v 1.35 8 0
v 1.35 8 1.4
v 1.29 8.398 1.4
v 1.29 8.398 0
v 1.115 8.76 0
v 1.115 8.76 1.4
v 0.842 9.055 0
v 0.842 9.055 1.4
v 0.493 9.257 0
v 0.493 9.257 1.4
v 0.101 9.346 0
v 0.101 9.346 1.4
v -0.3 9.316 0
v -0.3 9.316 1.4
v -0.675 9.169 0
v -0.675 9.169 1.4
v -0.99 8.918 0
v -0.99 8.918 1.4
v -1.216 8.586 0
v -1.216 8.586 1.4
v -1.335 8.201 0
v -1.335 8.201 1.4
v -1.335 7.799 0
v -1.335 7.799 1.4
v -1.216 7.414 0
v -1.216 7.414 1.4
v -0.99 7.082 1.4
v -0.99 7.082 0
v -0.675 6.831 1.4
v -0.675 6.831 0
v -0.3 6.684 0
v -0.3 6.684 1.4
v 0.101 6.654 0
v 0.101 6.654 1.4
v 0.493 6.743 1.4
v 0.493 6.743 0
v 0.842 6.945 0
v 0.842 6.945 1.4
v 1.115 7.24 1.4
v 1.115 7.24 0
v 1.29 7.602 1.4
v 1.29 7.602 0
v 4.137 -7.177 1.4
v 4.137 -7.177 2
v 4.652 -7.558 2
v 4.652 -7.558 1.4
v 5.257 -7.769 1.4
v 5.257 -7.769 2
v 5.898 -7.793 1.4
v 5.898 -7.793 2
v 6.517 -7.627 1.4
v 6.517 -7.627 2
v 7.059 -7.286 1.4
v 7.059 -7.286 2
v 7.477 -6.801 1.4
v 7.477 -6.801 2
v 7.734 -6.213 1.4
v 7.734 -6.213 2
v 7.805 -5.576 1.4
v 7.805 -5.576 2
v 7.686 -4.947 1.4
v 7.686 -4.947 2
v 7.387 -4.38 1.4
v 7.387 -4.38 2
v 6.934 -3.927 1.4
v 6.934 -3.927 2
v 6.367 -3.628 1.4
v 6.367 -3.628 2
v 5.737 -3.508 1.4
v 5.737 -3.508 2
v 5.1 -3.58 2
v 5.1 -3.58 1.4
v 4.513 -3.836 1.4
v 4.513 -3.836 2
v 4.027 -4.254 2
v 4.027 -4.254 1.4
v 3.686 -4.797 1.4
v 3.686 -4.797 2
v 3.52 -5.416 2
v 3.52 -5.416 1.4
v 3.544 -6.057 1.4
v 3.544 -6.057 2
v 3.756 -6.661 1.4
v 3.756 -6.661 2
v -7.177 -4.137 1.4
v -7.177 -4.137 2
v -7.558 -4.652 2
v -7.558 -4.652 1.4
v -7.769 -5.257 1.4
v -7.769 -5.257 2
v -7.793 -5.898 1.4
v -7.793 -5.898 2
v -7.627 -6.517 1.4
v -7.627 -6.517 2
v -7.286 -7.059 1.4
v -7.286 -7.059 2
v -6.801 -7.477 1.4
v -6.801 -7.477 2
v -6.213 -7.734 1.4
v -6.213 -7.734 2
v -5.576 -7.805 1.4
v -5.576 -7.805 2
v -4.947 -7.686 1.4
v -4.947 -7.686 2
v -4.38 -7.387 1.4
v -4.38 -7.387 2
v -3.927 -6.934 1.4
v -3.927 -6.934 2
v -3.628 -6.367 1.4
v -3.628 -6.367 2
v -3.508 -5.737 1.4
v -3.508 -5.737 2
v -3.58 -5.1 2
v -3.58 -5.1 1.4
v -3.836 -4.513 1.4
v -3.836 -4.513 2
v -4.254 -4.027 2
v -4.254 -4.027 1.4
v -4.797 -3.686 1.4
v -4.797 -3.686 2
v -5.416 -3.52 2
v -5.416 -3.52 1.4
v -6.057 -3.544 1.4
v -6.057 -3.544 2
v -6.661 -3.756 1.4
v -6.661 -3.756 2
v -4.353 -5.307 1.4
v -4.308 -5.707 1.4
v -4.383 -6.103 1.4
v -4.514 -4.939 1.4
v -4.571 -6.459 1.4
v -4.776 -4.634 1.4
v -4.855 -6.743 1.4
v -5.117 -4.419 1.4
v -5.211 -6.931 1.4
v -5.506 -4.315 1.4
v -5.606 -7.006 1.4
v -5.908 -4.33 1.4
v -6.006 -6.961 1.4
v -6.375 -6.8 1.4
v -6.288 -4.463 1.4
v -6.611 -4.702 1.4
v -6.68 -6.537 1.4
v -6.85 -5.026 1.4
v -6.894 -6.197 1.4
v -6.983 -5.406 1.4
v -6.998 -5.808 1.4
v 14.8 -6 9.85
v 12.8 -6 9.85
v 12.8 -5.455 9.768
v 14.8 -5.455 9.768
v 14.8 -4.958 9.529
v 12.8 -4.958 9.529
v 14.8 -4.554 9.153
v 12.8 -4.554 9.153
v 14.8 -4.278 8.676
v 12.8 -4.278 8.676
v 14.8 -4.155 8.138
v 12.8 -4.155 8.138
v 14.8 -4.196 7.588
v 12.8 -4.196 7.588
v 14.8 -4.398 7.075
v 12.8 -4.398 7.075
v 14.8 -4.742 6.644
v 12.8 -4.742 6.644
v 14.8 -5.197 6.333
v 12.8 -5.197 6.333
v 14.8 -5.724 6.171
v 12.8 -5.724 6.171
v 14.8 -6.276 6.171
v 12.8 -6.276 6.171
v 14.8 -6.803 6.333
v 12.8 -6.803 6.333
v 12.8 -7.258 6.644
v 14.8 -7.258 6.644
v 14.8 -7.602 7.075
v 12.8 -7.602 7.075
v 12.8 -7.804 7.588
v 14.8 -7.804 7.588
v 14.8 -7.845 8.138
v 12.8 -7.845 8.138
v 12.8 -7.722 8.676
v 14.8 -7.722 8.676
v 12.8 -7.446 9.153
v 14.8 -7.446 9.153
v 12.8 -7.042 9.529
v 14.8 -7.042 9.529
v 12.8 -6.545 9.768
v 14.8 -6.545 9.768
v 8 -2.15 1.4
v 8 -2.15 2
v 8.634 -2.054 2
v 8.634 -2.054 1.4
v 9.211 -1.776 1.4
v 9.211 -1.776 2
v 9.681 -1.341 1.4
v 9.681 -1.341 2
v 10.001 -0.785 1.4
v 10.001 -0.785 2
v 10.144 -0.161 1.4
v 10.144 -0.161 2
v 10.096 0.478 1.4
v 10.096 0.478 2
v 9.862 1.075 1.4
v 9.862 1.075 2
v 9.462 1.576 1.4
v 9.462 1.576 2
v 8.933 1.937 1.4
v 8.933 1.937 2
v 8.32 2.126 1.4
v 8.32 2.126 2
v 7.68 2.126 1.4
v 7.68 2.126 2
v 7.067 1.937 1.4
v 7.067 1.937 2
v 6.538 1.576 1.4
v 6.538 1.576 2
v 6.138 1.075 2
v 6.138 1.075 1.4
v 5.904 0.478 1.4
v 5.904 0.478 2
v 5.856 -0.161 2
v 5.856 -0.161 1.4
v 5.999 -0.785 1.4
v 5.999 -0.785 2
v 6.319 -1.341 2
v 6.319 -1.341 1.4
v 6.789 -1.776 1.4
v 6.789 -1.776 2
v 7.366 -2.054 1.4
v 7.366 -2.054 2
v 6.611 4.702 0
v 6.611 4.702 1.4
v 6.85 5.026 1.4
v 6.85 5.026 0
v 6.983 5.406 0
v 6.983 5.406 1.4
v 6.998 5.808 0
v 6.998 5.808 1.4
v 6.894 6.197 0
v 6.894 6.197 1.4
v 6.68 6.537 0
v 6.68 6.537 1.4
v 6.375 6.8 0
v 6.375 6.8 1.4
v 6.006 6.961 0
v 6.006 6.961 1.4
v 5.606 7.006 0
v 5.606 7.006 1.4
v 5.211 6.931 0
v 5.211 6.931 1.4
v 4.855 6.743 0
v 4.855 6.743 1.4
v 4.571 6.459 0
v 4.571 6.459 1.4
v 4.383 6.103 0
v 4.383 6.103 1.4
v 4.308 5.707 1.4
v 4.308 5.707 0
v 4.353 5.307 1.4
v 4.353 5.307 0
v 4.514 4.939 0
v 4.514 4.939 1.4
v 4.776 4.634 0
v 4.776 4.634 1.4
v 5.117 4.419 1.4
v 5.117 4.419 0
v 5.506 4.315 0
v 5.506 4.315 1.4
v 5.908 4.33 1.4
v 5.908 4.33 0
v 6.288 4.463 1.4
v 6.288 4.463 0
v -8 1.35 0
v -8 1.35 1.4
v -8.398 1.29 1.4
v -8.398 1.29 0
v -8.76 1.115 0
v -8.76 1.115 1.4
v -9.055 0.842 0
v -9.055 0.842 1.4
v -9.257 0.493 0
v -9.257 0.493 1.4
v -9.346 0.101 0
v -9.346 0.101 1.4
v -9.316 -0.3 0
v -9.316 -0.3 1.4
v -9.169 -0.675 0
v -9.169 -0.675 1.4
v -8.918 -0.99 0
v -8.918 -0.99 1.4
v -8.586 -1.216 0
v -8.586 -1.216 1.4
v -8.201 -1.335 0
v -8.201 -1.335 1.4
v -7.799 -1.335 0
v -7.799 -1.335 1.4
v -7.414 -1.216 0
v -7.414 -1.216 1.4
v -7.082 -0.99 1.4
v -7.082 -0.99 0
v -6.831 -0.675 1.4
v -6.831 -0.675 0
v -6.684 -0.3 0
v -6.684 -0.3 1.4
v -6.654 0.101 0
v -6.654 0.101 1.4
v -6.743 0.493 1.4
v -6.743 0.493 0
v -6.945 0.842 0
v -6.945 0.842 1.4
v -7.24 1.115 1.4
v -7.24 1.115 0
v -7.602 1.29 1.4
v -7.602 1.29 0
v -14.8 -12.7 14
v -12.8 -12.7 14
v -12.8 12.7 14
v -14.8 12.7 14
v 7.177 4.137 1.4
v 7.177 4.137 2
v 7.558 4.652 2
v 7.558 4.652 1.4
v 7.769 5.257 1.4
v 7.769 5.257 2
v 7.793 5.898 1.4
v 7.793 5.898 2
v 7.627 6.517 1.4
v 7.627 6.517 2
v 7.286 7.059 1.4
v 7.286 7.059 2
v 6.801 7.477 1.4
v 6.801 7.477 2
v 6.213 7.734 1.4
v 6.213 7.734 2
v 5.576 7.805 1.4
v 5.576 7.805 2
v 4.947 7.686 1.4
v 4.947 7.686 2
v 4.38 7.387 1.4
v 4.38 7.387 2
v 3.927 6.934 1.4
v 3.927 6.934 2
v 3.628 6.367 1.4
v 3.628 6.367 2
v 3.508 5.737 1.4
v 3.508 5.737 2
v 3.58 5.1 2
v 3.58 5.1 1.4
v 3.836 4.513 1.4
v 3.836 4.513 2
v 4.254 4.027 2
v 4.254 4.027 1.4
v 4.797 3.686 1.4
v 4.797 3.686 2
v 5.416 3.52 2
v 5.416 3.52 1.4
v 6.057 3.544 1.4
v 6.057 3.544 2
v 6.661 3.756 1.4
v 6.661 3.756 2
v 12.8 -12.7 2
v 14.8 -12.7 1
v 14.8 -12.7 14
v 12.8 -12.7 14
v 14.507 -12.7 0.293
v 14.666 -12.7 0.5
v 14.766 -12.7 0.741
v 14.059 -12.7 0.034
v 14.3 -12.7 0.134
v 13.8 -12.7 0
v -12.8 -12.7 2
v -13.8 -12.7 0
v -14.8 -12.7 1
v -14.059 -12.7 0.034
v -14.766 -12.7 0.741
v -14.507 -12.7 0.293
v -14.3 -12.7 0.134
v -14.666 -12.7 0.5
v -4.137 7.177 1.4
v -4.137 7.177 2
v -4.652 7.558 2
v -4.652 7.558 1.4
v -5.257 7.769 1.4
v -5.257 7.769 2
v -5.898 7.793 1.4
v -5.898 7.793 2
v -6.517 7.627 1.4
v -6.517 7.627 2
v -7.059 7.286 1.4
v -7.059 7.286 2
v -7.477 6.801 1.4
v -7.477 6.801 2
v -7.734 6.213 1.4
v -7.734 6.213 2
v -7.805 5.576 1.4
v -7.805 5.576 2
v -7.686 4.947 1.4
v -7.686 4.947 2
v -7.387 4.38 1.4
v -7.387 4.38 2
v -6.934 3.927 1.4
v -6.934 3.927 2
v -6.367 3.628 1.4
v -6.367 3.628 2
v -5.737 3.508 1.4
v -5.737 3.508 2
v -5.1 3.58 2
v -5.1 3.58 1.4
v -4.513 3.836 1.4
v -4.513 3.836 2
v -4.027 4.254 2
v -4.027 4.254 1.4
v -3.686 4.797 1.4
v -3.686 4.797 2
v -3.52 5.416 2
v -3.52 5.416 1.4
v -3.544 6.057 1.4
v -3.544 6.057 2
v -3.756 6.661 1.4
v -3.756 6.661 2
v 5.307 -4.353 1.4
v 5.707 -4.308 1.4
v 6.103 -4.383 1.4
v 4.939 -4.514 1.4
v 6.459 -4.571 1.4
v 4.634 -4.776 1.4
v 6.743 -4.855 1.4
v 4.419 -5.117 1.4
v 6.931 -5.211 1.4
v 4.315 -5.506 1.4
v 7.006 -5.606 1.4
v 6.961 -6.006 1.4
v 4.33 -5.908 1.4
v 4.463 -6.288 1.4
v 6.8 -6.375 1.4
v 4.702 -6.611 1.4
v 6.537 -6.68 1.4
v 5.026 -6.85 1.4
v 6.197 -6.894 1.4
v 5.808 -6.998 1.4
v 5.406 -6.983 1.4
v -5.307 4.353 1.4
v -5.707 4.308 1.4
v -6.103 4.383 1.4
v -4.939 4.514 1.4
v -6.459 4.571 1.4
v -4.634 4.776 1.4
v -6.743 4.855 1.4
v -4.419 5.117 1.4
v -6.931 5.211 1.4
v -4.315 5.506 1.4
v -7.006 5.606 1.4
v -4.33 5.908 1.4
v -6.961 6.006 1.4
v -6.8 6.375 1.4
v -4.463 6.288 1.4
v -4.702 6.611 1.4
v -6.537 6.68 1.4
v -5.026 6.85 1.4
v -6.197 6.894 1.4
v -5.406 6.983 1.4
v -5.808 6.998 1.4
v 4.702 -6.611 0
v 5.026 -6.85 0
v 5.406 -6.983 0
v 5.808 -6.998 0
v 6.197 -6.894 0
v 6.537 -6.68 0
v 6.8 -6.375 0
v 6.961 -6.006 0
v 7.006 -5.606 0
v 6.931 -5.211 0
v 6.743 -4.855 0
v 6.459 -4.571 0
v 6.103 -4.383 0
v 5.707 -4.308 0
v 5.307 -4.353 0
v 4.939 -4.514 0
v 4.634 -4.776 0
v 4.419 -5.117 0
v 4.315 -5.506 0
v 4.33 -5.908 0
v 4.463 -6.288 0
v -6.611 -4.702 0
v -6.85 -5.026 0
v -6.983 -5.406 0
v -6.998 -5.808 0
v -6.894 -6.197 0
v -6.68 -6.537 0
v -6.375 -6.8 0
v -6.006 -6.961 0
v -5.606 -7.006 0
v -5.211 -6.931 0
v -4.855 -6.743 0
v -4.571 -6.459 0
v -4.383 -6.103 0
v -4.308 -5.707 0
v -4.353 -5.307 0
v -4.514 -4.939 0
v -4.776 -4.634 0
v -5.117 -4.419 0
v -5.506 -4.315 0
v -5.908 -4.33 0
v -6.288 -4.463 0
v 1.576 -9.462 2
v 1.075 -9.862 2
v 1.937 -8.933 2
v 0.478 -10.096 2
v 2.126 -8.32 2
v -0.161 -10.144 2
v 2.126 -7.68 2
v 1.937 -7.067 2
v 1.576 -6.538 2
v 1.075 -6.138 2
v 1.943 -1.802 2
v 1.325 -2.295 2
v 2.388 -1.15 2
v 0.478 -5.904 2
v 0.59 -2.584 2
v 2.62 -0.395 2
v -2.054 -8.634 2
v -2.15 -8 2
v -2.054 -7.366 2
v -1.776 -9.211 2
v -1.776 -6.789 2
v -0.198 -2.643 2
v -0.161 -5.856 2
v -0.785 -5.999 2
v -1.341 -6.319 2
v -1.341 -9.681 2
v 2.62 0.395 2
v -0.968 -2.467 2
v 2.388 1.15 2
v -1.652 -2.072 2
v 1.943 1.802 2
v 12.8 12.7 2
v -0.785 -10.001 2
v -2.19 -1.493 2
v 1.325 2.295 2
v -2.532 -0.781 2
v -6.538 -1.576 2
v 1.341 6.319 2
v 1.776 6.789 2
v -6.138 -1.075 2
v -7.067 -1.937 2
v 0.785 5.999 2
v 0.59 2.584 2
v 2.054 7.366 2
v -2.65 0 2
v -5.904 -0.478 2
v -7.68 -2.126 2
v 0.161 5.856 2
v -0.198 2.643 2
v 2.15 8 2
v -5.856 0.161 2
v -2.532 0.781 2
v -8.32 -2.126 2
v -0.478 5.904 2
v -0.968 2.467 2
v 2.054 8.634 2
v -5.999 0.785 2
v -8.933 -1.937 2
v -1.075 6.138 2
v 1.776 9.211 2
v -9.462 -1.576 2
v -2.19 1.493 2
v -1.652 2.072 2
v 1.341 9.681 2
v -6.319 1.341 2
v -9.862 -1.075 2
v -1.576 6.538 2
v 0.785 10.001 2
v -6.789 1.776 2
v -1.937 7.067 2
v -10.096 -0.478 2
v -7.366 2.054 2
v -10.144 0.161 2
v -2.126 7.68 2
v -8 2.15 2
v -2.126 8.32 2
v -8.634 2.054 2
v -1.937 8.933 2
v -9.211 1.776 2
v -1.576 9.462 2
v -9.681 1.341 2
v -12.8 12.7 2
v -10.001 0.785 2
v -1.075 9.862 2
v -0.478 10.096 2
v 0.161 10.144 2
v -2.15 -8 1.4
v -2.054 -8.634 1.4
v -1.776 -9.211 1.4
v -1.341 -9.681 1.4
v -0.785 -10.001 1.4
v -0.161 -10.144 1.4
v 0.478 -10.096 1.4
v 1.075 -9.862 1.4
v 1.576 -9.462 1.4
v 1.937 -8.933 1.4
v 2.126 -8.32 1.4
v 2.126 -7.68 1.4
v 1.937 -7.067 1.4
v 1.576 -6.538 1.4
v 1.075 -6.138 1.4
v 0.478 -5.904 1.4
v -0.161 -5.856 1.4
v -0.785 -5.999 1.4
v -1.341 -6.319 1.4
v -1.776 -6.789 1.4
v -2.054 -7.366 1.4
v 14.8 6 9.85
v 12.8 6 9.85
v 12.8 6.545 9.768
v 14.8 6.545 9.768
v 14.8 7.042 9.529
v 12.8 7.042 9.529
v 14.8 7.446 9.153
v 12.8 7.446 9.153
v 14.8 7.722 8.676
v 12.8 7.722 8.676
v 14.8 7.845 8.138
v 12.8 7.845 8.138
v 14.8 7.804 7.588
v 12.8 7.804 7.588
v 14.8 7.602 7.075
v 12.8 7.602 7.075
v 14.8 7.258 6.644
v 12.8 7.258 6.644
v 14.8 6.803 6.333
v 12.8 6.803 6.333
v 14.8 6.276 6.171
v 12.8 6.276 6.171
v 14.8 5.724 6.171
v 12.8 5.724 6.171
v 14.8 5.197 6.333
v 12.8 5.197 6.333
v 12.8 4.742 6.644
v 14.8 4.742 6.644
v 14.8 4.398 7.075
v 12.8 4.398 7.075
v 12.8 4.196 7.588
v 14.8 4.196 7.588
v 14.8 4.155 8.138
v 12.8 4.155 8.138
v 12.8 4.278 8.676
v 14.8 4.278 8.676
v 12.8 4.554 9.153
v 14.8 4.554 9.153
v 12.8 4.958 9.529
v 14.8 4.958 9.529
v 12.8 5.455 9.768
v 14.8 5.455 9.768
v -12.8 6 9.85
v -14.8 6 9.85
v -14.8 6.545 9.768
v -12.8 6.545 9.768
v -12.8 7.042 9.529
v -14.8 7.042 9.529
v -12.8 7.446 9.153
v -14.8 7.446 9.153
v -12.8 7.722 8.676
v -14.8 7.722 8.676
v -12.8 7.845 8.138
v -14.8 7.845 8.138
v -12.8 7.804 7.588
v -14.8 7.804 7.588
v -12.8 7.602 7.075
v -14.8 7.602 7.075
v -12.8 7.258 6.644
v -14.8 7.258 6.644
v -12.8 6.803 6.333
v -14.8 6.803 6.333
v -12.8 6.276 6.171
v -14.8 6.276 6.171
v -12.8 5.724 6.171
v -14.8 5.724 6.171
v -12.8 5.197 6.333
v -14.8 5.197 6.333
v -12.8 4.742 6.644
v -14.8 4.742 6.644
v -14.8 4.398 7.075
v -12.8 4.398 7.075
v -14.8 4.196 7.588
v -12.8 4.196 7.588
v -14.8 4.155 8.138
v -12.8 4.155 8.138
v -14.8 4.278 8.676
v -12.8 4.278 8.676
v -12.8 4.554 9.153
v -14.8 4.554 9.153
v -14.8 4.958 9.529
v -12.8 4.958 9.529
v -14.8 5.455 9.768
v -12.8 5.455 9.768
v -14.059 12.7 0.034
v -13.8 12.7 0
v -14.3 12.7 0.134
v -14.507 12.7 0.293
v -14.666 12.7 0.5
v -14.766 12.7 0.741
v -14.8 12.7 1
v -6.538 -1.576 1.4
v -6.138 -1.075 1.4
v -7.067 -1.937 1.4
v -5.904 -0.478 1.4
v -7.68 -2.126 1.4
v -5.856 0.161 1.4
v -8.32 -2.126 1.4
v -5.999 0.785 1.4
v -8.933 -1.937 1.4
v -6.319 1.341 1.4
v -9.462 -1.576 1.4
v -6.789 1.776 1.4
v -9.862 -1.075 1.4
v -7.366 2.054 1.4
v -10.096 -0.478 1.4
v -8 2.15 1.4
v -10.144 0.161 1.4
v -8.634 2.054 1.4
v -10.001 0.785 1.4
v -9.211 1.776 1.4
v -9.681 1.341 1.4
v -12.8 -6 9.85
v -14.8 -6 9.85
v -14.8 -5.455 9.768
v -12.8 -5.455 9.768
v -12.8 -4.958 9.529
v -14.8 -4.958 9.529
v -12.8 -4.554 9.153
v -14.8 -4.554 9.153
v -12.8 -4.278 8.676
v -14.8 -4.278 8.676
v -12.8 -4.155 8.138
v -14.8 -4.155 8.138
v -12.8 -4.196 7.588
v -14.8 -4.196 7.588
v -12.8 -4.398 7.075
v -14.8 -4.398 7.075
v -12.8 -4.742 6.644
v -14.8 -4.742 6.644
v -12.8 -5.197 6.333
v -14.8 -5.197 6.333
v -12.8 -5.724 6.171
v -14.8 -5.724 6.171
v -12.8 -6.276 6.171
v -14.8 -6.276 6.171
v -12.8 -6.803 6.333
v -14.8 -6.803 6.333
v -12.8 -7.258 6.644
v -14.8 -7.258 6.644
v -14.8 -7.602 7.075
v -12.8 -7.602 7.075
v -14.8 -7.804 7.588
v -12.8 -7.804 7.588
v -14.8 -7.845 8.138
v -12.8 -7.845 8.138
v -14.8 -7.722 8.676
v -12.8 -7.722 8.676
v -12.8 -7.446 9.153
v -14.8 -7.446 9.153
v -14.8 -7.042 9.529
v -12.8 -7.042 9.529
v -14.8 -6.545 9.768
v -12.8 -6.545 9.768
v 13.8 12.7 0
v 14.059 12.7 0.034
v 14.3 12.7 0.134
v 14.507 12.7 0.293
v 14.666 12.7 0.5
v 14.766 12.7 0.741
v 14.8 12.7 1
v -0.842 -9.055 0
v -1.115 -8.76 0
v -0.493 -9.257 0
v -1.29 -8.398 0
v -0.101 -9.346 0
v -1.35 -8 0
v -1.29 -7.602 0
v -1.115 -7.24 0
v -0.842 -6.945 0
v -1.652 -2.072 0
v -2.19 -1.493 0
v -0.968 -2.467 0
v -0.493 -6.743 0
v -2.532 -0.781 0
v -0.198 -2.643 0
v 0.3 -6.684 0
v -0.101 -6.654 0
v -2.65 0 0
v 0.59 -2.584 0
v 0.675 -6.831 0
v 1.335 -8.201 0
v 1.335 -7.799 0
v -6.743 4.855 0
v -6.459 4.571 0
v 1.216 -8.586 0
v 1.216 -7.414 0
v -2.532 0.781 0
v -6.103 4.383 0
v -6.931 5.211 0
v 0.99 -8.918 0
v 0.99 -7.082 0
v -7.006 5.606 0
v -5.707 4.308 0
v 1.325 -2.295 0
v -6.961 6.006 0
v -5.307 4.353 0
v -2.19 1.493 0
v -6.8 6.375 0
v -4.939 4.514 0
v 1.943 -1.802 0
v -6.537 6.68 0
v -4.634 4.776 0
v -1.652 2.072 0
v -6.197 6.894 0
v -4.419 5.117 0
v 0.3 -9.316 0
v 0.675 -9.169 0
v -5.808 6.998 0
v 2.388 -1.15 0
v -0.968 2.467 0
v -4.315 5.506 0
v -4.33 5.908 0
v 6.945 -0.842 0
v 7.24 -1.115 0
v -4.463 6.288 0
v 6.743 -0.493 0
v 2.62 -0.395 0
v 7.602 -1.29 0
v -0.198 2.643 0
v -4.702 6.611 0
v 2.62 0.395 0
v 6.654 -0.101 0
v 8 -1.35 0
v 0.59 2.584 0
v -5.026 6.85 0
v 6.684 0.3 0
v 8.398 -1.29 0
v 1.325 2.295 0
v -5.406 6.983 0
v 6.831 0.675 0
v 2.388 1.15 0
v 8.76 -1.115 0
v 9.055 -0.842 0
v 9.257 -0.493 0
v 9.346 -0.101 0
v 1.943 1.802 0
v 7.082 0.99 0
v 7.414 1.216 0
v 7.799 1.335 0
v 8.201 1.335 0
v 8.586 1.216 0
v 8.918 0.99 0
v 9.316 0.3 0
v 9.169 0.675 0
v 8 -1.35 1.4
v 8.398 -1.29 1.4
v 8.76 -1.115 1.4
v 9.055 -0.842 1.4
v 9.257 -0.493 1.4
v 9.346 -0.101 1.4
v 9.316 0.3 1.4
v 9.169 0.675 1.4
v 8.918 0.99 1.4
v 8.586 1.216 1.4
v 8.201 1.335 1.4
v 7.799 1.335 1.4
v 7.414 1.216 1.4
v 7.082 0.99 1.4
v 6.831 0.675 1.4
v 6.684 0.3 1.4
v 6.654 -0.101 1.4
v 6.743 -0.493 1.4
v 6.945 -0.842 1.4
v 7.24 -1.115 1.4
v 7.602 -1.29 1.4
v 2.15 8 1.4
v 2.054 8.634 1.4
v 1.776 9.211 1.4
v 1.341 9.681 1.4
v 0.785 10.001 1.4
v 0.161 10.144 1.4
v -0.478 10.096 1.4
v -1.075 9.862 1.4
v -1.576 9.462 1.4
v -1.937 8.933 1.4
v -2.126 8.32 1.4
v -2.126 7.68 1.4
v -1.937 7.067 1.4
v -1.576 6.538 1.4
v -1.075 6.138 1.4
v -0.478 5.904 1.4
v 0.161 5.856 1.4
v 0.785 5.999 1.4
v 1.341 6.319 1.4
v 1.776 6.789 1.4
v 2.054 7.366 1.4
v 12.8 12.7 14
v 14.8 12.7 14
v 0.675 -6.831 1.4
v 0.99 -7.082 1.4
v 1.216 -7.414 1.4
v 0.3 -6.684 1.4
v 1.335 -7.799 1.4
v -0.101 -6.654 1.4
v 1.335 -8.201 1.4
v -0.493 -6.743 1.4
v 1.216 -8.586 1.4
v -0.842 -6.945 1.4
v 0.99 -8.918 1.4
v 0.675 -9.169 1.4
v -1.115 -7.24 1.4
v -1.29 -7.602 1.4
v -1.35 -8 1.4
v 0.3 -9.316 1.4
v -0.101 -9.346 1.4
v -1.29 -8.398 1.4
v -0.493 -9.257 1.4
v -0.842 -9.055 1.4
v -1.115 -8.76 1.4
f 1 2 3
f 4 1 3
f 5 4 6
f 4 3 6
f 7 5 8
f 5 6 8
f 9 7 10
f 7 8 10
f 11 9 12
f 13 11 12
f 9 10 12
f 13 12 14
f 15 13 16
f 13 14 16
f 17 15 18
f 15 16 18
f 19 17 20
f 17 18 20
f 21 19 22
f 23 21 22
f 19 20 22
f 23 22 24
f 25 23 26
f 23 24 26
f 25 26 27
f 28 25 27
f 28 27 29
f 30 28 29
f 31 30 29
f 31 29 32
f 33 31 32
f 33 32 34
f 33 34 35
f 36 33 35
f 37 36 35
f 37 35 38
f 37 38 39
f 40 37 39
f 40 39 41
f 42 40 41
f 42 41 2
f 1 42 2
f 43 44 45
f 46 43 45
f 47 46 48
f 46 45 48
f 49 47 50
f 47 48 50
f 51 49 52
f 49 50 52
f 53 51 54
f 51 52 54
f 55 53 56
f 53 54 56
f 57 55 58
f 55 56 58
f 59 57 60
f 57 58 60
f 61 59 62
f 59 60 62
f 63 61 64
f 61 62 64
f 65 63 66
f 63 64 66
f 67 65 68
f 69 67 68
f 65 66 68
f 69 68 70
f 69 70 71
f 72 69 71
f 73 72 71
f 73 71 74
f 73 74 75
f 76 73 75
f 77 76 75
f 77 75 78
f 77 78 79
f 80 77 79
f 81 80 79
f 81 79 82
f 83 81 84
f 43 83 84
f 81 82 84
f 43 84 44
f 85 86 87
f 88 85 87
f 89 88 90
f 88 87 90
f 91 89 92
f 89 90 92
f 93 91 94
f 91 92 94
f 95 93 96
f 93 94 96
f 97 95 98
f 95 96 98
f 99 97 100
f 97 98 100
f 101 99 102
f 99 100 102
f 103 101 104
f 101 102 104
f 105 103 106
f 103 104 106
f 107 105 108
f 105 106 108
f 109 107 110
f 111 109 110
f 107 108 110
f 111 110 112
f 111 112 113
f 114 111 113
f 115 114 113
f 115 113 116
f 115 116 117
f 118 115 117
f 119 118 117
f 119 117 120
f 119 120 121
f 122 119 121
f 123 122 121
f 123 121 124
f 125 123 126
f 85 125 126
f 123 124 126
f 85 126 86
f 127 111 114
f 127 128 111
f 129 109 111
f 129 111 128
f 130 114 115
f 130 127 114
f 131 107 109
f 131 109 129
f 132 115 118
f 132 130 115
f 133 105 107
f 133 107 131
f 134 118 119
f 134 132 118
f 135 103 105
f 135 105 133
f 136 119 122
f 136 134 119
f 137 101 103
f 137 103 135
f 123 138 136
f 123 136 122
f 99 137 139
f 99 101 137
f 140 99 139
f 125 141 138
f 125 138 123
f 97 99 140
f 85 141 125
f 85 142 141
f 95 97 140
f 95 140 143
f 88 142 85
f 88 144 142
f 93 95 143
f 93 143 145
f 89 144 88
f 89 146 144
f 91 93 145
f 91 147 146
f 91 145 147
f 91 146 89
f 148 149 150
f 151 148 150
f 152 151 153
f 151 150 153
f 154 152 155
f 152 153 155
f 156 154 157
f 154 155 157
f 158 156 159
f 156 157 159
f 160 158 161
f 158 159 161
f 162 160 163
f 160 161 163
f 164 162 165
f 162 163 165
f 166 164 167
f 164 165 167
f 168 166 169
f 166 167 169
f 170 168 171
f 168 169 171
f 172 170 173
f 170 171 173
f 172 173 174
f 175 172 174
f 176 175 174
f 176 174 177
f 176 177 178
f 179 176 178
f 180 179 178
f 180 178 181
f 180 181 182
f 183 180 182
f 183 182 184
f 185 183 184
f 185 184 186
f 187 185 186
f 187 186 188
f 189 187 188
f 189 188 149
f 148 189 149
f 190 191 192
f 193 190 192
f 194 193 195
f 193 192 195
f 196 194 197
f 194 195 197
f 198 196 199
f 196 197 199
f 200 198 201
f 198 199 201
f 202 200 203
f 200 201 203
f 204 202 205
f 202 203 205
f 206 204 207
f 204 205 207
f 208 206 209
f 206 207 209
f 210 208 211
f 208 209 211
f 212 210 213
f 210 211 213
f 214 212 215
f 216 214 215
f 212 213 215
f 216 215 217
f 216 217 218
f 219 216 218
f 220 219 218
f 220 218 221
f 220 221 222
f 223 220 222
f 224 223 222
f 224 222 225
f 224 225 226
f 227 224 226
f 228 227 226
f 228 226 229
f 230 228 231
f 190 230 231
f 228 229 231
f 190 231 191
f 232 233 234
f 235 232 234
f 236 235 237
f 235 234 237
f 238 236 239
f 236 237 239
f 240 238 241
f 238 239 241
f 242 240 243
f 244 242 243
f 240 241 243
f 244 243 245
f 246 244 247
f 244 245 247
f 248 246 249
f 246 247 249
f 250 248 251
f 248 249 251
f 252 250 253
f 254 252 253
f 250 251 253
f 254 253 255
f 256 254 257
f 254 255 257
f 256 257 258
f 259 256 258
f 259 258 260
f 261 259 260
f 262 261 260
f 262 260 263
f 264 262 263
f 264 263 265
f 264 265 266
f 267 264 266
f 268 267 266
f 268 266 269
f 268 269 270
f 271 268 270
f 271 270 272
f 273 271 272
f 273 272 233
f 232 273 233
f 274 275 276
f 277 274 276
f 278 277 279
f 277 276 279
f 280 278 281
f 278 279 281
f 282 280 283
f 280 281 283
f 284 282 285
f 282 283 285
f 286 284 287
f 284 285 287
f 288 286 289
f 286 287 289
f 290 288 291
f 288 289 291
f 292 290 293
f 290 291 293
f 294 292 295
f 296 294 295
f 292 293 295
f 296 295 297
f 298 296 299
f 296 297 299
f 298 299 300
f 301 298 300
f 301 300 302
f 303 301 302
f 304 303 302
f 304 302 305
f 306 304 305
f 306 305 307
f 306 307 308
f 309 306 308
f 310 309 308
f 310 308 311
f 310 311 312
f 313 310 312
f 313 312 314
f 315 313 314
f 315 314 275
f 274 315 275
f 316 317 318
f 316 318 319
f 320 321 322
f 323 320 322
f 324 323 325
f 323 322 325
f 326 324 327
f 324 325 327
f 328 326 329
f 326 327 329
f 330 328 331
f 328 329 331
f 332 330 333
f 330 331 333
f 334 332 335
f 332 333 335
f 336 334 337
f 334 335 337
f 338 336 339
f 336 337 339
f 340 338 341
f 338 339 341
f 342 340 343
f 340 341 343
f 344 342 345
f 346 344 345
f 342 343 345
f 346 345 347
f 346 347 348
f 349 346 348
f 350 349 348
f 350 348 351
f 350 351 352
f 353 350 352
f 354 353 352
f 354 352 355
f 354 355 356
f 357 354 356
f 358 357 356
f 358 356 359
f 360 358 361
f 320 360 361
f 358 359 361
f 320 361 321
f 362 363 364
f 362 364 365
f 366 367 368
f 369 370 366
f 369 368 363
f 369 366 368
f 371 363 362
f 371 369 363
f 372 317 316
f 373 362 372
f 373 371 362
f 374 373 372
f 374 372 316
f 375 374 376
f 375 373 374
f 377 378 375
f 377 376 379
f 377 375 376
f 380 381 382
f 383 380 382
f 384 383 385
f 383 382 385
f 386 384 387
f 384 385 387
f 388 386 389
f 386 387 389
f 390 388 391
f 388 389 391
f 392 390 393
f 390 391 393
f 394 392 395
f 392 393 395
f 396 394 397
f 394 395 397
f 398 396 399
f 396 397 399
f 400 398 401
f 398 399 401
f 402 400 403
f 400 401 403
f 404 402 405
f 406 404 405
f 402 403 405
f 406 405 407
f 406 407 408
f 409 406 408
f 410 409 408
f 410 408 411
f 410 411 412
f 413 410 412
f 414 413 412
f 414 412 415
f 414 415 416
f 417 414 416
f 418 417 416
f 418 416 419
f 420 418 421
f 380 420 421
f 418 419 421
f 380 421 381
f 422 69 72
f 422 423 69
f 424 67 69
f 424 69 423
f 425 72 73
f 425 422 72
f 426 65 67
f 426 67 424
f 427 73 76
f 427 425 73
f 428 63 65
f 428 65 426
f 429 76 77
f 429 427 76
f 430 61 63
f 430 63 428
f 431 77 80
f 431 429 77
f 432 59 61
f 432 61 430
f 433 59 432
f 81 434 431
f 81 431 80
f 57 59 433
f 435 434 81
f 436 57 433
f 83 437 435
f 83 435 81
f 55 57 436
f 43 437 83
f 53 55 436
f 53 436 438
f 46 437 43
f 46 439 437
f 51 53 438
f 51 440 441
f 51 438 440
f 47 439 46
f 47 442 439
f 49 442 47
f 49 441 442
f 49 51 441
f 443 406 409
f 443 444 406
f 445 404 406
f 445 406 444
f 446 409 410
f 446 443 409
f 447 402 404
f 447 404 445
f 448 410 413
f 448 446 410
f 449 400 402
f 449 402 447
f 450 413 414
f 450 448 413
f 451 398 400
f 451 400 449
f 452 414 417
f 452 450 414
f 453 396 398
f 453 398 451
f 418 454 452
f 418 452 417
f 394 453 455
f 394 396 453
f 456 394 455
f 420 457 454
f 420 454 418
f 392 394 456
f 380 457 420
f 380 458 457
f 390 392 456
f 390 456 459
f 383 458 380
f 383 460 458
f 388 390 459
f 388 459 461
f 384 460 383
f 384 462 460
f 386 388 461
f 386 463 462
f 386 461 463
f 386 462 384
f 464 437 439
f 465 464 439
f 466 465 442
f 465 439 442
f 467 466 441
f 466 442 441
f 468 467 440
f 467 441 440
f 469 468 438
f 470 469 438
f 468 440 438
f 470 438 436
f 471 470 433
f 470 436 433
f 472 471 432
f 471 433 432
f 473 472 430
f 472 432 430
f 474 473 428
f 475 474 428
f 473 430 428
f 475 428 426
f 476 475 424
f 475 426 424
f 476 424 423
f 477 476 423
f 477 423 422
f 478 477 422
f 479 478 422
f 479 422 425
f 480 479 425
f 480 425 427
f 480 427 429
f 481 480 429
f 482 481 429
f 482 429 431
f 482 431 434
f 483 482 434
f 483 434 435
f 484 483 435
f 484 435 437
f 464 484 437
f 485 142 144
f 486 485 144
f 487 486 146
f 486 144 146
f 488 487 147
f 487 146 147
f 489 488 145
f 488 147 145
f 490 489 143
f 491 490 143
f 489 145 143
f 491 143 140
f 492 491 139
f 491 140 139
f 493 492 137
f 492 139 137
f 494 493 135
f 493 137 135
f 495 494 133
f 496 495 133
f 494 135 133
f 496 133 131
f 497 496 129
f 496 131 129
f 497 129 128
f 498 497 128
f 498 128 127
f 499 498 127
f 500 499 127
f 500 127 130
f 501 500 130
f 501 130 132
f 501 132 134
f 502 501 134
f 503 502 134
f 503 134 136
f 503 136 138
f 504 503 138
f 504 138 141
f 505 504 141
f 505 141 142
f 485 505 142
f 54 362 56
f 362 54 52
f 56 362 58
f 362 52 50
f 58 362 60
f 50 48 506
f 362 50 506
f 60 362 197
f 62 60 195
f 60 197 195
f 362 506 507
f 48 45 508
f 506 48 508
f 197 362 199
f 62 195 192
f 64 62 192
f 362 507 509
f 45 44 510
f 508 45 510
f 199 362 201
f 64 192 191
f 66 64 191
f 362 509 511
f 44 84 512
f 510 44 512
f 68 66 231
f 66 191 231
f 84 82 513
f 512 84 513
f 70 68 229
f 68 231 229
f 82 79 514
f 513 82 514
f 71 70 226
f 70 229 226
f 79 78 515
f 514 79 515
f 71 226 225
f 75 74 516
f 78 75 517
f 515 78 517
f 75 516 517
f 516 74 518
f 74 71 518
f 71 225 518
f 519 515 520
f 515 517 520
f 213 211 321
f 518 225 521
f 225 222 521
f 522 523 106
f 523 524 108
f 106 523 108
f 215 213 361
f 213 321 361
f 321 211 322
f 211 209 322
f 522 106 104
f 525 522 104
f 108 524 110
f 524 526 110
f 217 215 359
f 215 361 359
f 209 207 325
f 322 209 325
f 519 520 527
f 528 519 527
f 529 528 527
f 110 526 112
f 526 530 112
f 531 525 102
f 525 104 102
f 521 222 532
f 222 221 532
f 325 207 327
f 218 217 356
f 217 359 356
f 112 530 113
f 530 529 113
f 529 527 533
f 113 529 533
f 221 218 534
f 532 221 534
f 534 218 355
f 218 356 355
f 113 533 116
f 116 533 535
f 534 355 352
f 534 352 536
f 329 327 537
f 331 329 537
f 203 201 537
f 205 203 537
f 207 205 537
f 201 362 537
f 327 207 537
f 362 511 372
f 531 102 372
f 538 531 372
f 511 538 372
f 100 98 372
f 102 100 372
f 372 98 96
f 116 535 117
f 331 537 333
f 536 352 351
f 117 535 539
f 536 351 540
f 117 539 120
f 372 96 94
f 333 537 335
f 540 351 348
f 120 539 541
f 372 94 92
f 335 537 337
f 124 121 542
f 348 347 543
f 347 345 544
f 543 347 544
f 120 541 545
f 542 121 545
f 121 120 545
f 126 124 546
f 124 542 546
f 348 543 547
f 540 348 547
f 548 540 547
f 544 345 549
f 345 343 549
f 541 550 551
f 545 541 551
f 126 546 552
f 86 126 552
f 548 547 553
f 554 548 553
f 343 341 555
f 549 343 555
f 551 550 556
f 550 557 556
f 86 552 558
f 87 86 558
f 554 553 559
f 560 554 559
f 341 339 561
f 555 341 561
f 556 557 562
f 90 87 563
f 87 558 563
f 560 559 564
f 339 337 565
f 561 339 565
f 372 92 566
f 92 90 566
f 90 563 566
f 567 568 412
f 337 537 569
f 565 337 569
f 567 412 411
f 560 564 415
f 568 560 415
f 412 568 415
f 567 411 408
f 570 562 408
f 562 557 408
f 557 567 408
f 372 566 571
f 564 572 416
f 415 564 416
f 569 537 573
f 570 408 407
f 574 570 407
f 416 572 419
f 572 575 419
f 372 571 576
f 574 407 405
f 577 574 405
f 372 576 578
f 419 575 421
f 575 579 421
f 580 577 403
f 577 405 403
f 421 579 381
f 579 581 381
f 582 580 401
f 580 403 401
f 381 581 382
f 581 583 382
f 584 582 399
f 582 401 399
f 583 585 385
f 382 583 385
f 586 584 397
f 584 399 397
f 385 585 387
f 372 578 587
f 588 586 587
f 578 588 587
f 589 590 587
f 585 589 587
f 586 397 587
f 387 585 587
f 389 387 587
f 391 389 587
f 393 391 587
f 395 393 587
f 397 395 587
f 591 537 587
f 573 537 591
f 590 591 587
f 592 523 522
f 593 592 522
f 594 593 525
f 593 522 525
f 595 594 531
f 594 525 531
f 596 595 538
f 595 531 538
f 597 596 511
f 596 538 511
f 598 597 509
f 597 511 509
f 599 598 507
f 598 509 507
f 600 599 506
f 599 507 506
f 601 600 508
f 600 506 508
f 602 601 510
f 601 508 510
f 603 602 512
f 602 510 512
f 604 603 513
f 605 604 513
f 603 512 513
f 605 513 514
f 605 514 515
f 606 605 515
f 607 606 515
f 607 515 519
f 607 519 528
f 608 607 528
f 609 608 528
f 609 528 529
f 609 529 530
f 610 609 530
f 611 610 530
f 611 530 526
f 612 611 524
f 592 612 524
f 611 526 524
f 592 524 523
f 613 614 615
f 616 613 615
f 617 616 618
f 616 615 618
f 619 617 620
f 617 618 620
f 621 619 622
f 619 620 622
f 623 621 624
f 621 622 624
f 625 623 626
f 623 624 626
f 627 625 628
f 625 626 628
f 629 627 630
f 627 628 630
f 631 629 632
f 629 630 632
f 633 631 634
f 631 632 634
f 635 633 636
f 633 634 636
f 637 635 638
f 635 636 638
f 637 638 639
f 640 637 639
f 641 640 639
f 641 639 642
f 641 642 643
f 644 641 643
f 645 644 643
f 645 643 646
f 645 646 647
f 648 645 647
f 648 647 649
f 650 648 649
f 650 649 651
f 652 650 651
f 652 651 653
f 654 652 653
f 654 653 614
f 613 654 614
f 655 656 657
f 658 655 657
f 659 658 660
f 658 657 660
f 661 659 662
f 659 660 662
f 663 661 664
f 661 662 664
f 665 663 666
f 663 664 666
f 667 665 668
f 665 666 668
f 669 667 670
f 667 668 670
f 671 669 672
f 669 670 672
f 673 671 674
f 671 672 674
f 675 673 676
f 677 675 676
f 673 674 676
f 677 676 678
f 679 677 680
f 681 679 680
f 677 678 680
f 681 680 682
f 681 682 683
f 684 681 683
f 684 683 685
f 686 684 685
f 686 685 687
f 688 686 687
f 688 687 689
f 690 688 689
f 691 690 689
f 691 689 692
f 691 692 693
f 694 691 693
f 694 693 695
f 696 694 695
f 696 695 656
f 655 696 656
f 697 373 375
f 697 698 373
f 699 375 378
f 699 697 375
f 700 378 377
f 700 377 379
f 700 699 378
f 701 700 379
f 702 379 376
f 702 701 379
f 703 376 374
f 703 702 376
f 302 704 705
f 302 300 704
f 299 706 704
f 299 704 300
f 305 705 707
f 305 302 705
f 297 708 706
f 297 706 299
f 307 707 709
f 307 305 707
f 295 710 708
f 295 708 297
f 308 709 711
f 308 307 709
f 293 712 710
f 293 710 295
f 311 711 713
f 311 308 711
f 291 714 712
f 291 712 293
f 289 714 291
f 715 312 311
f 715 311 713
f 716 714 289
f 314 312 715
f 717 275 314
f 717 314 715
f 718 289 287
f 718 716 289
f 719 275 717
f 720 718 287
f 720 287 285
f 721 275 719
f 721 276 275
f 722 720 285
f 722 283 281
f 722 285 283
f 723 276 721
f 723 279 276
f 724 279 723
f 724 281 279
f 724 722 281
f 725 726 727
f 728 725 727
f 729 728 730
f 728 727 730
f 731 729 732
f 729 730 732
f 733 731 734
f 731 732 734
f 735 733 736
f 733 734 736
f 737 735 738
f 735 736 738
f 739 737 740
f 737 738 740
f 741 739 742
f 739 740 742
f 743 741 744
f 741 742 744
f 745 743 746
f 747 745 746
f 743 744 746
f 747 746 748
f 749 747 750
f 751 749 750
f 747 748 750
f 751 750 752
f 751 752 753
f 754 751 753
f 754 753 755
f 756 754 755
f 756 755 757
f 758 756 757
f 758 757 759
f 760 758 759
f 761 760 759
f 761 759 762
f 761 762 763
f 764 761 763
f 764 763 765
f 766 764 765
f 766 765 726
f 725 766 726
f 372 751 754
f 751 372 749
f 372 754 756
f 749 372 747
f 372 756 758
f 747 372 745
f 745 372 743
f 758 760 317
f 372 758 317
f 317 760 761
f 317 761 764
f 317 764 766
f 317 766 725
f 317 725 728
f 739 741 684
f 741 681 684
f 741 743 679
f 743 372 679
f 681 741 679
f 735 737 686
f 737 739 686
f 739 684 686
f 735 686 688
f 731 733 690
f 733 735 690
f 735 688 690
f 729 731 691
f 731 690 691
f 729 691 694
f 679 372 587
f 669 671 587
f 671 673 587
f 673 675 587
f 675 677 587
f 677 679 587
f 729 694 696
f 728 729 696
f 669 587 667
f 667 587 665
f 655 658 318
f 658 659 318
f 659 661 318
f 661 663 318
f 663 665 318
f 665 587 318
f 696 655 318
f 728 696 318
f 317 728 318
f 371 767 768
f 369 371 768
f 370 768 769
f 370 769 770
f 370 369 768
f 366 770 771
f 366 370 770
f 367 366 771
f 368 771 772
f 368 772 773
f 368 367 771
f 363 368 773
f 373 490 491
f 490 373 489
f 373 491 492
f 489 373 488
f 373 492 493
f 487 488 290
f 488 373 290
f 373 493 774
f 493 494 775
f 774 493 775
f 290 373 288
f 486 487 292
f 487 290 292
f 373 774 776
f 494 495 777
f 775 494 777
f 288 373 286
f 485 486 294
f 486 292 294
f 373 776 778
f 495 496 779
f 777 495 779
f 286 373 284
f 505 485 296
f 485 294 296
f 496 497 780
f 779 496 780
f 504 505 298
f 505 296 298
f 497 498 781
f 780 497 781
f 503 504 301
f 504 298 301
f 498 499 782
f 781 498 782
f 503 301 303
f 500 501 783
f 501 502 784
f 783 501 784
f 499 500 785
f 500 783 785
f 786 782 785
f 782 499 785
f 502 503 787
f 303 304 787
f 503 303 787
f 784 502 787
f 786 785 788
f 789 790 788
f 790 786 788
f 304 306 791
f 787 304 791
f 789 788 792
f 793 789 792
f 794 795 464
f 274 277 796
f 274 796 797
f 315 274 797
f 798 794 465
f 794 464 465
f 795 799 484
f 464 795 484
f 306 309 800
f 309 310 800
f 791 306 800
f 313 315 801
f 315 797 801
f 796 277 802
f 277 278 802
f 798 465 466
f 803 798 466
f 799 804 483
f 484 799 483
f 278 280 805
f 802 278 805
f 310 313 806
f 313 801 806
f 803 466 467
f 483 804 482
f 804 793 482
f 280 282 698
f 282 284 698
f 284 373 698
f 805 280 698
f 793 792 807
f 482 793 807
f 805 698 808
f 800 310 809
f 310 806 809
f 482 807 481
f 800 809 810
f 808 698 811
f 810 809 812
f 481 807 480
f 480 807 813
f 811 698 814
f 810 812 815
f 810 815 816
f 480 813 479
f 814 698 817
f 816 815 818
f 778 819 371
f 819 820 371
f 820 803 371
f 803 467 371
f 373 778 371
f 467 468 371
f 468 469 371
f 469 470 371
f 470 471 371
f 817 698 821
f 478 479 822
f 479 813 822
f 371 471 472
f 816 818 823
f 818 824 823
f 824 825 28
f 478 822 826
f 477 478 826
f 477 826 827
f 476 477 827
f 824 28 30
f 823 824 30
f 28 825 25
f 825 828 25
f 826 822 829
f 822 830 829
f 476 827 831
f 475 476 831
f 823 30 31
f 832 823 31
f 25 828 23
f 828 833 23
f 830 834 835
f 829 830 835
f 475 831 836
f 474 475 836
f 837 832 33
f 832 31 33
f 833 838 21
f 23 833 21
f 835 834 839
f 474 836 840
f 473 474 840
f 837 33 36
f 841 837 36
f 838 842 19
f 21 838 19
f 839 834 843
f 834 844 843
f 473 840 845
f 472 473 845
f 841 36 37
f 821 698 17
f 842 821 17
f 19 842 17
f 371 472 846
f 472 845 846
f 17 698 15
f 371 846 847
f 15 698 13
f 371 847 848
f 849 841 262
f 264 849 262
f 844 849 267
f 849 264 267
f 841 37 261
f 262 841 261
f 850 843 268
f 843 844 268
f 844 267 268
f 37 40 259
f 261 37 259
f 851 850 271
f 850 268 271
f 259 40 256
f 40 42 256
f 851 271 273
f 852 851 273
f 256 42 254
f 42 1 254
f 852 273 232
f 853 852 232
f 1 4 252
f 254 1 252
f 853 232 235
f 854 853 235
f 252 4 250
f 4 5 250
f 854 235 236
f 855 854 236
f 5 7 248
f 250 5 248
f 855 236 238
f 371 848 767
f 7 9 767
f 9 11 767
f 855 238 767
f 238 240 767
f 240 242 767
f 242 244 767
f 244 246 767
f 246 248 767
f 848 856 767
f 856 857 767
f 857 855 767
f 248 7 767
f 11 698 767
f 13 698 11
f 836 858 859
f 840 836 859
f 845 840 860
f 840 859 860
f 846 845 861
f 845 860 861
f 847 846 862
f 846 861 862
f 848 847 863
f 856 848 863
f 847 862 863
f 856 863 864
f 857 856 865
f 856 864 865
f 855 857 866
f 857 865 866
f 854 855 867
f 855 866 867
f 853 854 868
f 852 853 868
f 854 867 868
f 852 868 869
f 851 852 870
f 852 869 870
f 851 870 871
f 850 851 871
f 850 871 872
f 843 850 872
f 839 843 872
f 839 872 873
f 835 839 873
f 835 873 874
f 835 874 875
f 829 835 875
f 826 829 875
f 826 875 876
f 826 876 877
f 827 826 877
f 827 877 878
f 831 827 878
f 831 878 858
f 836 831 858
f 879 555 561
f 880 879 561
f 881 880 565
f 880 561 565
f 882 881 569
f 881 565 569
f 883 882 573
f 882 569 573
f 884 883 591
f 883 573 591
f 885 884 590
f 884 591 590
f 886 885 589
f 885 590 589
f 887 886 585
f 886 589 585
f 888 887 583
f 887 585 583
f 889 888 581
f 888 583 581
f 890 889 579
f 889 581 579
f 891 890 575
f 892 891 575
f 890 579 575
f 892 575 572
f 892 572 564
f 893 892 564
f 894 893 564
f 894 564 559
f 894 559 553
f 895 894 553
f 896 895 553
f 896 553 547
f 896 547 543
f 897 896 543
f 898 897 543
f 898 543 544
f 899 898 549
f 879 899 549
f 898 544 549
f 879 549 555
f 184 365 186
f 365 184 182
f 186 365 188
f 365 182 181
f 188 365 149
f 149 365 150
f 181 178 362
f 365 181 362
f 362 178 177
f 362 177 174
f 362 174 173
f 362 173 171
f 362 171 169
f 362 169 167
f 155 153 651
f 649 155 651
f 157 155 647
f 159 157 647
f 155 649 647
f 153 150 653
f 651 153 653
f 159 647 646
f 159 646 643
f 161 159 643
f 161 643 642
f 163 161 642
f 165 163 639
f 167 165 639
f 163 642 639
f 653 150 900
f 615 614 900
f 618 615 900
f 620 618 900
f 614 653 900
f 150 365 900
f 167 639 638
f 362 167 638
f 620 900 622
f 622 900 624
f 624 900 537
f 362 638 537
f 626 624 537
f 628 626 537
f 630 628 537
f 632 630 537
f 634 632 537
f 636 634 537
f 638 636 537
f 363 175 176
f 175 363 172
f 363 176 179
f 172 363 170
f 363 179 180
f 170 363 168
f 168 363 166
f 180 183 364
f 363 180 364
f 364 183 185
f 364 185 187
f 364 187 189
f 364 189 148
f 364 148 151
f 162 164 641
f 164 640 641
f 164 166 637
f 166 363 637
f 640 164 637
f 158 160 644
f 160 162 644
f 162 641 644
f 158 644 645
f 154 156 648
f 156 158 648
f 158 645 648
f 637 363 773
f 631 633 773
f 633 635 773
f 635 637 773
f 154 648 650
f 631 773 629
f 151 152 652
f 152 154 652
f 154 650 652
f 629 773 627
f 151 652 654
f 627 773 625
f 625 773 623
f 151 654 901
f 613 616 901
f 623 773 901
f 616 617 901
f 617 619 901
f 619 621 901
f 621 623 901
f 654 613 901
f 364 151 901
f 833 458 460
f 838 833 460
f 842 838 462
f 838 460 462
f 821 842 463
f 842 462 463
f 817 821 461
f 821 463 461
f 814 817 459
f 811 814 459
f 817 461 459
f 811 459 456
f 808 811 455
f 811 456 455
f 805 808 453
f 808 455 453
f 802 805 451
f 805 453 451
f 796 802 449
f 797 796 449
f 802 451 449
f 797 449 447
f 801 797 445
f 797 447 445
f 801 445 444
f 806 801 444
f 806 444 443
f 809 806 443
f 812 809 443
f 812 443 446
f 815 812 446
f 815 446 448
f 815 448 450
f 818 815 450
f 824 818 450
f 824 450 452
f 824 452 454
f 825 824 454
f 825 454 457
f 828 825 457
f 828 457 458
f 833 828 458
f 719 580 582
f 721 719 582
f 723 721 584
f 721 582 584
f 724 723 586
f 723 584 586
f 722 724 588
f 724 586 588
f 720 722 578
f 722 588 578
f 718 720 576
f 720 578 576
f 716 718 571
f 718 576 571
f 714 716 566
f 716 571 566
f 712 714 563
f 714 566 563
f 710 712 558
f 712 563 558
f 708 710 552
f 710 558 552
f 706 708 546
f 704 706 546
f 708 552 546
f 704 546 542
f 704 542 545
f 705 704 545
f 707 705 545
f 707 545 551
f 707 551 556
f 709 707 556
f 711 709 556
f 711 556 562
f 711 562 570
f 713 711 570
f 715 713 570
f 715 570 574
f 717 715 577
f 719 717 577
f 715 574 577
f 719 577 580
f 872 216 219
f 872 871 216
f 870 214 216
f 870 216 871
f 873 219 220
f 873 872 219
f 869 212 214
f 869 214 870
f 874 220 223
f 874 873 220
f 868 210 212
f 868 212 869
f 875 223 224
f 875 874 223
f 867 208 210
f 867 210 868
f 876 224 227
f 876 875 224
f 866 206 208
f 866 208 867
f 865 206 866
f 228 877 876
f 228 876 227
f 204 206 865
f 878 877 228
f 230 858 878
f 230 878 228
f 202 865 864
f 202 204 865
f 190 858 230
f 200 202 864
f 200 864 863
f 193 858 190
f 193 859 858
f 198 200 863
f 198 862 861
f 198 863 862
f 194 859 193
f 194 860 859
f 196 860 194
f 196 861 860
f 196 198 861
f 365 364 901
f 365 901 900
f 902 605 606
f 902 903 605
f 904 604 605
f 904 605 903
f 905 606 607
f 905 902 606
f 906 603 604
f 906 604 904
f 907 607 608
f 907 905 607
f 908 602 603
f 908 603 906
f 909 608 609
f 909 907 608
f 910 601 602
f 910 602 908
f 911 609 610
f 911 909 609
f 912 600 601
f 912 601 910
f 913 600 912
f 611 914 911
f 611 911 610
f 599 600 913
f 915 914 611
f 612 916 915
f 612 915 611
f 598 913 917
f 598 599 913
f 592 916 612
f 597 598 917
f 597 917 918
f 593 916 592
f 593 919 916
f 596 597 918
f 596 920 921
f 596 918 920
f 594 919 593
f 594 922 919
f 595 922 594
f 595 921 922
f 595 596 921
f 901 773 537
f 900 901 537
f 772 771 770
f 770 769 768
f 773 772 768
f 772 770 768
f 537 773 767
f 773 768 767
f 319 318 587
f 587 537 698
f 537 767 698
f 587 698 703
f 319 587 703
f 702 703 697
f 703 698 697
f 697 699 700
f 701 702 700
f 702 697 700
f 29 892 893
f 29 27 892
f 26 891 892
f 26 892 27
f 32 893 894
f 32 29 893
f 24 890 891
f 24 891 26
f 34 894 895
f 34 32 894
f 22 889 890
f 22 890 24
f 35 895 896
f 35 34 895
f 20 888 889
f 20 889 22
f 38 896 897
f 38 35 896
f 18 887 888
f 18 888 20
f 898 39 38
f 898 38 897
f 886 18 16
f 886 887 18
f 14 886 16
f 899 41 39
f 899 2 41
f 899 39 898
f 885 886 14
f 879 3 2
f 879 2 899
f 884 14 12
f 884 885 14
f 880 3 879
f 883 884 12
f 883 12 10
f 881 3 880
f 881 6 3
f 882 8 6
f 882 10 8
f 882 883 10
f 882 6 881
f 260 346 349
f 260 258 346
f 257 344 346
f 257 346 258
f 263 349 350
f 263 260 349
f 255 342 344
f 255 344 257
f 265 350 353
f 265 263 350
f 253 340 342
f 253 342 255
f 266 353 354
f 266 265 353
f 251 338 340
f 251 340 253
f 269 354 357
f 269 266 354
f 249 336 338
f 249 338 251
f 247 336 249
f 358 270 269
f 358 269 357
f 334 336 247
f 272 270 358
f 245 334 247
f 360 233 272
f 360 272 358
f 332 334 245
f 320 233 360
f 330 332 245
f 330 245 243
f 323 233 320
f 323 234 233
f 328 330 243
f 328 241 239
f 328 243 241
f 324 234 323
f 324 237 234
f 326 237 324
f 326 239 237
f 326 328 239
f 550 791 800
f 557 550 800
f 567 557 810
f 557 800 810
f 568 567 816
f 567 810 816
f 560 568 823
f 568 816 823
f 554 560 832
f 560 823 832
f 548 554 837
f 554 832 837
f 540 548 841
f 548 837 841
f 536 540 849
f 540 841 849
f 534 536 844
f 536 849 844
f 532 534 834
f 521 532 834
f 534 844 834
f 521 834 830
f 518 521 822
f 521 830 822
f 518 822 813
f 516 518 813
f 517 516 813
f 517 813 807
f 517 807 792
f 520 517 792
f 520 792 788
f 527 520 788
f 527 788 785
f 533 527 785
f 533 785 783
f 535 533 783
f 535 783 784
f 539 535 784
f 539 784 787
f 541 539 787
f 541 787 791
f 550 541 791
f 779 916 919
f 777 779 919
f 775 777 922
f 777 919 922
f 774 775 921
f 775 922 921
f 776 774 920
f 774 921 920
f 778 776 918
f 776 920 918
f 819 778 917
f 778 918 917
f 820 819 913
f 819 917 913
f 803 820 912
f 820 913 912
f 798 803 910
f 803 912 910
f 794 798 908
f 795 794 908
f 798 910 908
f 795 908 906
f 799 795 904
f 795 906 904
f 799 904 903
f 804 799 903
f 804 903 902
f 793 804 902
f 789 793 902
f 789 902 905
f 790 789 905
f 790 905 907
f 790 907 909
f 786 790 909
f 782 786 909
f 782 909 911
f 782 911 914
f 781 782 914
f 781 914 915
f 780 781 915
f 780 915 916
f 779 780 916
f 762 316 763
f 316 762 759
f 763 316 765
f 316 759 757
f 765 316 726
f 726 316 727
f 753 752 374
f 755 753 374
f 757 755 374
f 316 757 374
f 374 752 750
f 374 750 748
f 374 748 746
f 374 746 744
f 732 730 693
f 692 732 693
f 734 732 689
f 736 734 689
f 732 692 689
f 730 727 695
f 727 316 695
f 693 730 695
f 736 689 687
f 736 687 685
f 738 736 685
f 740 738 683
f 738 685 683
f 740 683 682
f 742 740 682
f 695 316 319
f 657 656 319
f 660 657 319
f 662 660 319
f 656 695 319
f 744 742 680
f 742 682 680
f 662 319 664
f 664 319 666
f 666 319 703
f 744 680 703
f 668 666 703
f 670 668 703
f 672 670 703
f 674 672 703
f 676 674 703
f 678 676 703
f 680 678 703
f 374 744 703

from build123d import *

# Parameters (mm, degrees)
BOSS_EXTRUDE1_DEPTH = 12.7
SKETCH2_R           = 1.85
CUT_EXTRUDE1_DEPTH  = 30.6
SKETCH3_R           = 2.65
CUT_EXTRUDE2_DEPTH  = 15
SKETCH4_R           = 1.35
CUT_EXTRUDE3_DEPTH  = 3
SKETCH5_R           = 2.15
CUT_EXTRUDE4_DEPTH  = 0.6
CIRPATTERN1_COUNT   = 8
FILLET1_R           = 1


with BuildPart() as part:
    # Sketch1 → Boss-Extrude1 (new body, symmetric)
    with BuildSketch(Plane(origin=(0, 0, 0), x_dir=(1, 0, 0), z_dir=(0, 1, 0))):
        Polygon((-14.8, 0), (14.8, 0), (14.8, -14), (12.8, -14), (12.8, -2), (-12.8, -2), (-12.8, -14), (-14.8, -14), align=None)
    extrude(amount=BOSS_EXTRUDE1_DEPTH, both=True)

    # Sketch2 → Cut-Extrude1 (cut, through all)
    with BuildSketch(Plane.ZY.offset(14.8)):
        with Locations((8, -6)):
            Circle(SKETCH2_R)
        with Locations((8, 6)):
            Circle(SKETCH2_R)
    extrude(amount=-CUT_EXTRUDE1_DEPTH, mode=Mode.SUBTRACT)

    # Sketch3 → Cut-Extrude2 (cut, through all)
    with BuildSketch(Plane(origin=(0, 0, 0), x_dir=(-1, 0, 0), z_dir=(0, 0, -1))):
        Circle(SKETCH3_R)
    extrude(amount=-CUT_EXTRUDE2_DEPTH, mode=Mode.SUBTRACT)

    # Sketch4 → Cut-Extrude3 (cut, through all)
    with BuildSketch(Plane.XY.offset(2)):
        with Locations((0, 8)):
            Circle(SKETCH4_R)
    cut_extrude3 = extrude(amount=-CUT_EXTRUDE3_DEPTH, mode=Mode.SUBTRACT)

    # Sketch5 → Cut-Extrude4 (cut)
    with BuildSketch(Plane.XY.offset(2)):
        with Locations((0, 8)):
            Circle(SKETCH5_R)
    cut_extrude4 = extrude(amount=-CUT_EXTRUDE4_DEPTH, mode=Mode.SUBTRACT)

    # CirPattern1: Cut-Extrude3, Cut-Extrude4 ×8 about axis
    cirpattern1_axis = Axis((0, 0, 0), (0, 0, 1))
    for i in range(1, CIRPATTERN1_COUNT):
        add(cut_extrude3.rotate(cirpattern1_axis, i * 360 / CIRPATTERN1_COUNT), mode=Mode.SUBTRACT)
        add(cut_extrude4.rotate(cirpattern1_axis, i * 360 / CIRPATTERN1_COUNT), mode=Mode.SUBTRACT)

    # Fillet1
    fillet1_edges = [part.edges().sort_by_distance(p)[0] for p in [
        (-14.8, 0, 0),
        (14.8, 0, 0),
    ]]
    fillet(fillet1_edges, radius=FILLET1_R)


solid = part.part
